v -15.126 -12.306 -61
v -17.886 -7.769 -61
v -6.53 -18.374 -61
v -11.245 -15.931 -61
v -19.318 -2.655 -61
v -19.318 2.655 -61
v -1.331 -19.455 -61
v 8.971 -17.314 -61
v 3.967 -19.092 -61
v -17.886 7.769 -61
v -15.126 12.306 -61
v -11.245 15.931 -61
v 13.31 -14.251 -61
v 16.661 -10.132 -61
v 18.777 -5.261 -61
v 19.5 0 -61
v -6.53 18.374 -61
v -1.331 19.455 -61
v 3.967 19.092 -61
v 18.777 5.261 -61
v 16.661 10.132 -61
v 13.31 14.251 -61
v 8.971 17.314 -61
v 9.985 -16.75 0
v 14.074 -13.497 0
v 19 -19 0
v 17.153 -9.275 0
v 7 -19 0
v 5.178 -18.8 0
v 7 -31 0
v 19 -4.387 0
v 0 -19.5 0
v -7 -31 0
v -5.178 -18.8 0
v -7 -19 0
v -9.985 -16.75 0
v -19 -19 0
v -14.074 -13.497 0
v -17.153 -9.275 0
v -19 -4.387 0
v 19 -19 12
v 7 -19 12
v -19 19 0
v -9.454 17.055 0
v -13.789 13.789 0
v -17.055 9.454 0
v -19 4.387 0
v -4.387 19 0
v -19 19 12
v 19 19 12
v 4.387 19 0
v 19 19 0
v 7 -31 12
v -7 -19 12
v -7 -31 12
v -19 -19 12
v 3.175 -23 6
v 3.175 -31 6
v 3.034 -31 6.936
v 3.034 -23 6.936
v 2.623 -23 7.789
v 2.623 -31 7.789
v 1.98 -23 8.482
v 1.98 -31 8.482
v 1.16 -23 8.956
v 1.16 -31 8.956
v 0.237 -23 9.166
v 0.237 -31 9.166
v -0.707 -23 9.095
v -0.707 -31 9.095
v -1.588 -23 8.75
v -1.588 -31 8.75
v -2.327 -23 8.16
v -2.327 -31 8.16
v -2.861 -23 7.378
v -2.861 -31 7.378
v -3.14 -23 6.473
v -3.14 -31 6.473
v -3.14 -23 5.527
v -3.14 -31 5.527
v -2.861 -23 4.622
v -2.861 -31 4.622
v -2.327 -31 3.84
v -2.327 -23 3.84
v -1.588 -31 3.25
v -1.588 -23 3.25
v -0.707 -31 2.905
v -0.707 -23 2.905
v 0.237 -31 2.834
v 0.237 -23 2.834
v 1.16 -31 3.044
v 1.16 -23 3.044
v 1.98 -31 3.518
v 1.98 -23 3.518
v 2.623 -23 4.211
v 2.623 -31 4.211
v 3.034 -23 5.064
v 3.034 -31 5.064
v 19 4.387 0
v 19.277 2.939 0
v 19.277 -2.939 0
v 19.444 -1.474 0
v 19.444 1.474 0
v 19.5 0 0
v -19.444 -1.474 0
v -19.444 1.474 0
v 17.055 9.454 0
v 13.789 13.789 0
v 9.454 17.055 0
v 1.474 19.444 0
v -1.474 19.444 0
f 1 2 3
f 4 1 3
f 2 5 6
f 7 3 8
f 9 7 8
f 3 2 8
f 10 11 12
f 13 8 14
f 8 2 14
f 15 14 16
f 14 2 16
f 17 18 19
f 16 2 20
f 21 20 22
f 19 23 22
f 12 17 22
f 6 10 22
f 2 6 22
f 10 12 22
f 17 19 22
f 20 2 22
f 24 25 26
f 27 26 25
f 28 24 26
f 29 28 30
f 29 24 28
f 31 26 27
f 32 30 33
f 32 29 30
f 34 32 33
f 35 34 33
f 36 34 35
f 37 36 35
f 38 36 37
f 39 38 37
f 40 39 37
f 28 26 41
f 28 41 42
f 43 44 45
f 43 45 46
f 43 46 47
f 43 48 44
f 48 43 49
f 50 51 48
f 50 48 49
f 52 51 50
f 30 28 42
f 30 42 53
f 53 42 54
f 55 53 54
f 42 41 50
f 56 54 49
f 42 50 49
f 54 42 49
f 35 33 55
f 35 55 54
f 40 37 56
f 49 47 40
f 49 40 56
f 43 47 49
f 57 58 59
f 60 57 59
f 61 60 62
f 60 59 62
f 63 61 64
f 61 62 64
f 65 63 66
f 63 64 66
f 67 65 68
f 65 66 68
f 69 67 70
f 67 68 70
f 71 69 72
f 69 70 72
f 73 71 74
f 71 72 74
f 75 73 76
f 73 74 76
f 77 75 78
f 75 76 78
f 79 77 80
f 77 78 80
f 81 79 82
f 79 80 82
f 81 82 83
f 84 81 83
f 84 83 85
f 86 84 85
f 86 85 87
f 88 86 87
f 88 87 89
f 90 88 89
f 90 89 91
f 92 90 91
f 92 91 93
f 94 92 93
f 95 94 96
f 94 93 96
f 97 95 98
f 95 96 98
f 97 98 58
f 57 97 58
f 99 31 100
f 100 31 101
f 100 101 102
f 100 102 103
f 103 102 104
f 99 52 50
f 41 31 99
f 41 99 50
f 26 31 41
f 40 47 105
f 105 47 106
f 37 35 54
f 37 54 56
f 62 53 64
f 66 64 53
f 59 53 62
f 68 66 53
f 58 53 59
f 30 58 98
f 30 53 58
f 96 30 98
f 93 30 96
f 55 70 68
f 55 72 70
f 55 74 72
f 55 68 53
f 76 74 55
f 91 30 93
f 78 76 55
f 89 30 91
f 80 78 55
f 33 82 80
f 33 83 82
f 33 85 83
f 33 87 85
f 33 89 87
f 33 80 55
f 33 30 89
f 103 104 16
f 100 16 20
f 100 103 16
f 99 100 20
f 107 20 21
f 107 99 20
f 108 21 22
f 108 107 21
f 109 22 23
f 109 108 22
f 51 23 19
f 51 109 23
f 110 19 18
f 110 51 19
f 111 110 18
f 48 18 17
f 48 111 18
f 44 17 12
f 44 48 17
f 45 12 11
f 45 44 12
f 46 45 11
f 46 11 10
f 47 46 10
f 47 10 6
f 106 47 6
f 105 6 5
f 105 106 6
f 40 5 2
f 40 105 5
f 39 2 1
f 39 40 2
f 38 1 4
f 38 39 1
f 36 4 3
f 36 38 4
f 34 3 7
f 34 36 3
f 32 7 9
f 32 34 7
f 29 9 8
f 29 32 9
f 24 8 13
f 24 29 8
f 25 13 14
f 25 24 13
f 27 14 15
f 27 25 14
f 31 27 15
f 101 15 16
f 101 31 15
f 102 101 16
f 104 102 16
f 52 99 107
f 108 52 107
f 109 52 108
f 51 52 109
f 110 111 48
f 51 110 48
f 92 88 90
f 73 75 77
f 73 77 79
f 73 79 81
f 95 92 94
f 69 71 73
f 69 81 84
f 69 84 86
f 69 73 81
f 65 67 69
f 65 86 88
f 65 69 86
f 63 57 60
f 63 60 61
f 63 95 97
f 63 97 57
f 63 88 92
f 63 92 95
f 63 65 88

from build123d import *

# Parameters (mm, degrees)
PAD_DEPTH    = 12
SKETCH001_R  = 19.5
PAD001_DEPTH = 61
SKETCH002_R  = 3.175
POCKET_DEPTH = 8


with BuildPart() as part:
    # Sketch → Pad (new body)
    with BuildSketch(Plane.XY):
        Polygon((-19, 19), (19, 19), (19, -19), (7, -19), (7, -31), (-7, -31), (-7, -19), (-19, -19), align=None)
    extrude(amount=PAD_DEPTH)

    # Sketch001 → Pad001 (join)
    with BuildSketch(Plane.XY):
        Circle(SKETCH001_R)
    extrude(amount=-PAD001_DEPTH)

    # Sketch002 (on Face6 of Pad001) → Pocket (cut)
    with BuildSketch(Plane.XZ.offset(31)):
        with Locations((0, 6)):
            Circle(SKETCH002_R)
    extrude(amount=-POCKET_DEPTH, mode=Mode.SUBTRACT)


solid = part.part
